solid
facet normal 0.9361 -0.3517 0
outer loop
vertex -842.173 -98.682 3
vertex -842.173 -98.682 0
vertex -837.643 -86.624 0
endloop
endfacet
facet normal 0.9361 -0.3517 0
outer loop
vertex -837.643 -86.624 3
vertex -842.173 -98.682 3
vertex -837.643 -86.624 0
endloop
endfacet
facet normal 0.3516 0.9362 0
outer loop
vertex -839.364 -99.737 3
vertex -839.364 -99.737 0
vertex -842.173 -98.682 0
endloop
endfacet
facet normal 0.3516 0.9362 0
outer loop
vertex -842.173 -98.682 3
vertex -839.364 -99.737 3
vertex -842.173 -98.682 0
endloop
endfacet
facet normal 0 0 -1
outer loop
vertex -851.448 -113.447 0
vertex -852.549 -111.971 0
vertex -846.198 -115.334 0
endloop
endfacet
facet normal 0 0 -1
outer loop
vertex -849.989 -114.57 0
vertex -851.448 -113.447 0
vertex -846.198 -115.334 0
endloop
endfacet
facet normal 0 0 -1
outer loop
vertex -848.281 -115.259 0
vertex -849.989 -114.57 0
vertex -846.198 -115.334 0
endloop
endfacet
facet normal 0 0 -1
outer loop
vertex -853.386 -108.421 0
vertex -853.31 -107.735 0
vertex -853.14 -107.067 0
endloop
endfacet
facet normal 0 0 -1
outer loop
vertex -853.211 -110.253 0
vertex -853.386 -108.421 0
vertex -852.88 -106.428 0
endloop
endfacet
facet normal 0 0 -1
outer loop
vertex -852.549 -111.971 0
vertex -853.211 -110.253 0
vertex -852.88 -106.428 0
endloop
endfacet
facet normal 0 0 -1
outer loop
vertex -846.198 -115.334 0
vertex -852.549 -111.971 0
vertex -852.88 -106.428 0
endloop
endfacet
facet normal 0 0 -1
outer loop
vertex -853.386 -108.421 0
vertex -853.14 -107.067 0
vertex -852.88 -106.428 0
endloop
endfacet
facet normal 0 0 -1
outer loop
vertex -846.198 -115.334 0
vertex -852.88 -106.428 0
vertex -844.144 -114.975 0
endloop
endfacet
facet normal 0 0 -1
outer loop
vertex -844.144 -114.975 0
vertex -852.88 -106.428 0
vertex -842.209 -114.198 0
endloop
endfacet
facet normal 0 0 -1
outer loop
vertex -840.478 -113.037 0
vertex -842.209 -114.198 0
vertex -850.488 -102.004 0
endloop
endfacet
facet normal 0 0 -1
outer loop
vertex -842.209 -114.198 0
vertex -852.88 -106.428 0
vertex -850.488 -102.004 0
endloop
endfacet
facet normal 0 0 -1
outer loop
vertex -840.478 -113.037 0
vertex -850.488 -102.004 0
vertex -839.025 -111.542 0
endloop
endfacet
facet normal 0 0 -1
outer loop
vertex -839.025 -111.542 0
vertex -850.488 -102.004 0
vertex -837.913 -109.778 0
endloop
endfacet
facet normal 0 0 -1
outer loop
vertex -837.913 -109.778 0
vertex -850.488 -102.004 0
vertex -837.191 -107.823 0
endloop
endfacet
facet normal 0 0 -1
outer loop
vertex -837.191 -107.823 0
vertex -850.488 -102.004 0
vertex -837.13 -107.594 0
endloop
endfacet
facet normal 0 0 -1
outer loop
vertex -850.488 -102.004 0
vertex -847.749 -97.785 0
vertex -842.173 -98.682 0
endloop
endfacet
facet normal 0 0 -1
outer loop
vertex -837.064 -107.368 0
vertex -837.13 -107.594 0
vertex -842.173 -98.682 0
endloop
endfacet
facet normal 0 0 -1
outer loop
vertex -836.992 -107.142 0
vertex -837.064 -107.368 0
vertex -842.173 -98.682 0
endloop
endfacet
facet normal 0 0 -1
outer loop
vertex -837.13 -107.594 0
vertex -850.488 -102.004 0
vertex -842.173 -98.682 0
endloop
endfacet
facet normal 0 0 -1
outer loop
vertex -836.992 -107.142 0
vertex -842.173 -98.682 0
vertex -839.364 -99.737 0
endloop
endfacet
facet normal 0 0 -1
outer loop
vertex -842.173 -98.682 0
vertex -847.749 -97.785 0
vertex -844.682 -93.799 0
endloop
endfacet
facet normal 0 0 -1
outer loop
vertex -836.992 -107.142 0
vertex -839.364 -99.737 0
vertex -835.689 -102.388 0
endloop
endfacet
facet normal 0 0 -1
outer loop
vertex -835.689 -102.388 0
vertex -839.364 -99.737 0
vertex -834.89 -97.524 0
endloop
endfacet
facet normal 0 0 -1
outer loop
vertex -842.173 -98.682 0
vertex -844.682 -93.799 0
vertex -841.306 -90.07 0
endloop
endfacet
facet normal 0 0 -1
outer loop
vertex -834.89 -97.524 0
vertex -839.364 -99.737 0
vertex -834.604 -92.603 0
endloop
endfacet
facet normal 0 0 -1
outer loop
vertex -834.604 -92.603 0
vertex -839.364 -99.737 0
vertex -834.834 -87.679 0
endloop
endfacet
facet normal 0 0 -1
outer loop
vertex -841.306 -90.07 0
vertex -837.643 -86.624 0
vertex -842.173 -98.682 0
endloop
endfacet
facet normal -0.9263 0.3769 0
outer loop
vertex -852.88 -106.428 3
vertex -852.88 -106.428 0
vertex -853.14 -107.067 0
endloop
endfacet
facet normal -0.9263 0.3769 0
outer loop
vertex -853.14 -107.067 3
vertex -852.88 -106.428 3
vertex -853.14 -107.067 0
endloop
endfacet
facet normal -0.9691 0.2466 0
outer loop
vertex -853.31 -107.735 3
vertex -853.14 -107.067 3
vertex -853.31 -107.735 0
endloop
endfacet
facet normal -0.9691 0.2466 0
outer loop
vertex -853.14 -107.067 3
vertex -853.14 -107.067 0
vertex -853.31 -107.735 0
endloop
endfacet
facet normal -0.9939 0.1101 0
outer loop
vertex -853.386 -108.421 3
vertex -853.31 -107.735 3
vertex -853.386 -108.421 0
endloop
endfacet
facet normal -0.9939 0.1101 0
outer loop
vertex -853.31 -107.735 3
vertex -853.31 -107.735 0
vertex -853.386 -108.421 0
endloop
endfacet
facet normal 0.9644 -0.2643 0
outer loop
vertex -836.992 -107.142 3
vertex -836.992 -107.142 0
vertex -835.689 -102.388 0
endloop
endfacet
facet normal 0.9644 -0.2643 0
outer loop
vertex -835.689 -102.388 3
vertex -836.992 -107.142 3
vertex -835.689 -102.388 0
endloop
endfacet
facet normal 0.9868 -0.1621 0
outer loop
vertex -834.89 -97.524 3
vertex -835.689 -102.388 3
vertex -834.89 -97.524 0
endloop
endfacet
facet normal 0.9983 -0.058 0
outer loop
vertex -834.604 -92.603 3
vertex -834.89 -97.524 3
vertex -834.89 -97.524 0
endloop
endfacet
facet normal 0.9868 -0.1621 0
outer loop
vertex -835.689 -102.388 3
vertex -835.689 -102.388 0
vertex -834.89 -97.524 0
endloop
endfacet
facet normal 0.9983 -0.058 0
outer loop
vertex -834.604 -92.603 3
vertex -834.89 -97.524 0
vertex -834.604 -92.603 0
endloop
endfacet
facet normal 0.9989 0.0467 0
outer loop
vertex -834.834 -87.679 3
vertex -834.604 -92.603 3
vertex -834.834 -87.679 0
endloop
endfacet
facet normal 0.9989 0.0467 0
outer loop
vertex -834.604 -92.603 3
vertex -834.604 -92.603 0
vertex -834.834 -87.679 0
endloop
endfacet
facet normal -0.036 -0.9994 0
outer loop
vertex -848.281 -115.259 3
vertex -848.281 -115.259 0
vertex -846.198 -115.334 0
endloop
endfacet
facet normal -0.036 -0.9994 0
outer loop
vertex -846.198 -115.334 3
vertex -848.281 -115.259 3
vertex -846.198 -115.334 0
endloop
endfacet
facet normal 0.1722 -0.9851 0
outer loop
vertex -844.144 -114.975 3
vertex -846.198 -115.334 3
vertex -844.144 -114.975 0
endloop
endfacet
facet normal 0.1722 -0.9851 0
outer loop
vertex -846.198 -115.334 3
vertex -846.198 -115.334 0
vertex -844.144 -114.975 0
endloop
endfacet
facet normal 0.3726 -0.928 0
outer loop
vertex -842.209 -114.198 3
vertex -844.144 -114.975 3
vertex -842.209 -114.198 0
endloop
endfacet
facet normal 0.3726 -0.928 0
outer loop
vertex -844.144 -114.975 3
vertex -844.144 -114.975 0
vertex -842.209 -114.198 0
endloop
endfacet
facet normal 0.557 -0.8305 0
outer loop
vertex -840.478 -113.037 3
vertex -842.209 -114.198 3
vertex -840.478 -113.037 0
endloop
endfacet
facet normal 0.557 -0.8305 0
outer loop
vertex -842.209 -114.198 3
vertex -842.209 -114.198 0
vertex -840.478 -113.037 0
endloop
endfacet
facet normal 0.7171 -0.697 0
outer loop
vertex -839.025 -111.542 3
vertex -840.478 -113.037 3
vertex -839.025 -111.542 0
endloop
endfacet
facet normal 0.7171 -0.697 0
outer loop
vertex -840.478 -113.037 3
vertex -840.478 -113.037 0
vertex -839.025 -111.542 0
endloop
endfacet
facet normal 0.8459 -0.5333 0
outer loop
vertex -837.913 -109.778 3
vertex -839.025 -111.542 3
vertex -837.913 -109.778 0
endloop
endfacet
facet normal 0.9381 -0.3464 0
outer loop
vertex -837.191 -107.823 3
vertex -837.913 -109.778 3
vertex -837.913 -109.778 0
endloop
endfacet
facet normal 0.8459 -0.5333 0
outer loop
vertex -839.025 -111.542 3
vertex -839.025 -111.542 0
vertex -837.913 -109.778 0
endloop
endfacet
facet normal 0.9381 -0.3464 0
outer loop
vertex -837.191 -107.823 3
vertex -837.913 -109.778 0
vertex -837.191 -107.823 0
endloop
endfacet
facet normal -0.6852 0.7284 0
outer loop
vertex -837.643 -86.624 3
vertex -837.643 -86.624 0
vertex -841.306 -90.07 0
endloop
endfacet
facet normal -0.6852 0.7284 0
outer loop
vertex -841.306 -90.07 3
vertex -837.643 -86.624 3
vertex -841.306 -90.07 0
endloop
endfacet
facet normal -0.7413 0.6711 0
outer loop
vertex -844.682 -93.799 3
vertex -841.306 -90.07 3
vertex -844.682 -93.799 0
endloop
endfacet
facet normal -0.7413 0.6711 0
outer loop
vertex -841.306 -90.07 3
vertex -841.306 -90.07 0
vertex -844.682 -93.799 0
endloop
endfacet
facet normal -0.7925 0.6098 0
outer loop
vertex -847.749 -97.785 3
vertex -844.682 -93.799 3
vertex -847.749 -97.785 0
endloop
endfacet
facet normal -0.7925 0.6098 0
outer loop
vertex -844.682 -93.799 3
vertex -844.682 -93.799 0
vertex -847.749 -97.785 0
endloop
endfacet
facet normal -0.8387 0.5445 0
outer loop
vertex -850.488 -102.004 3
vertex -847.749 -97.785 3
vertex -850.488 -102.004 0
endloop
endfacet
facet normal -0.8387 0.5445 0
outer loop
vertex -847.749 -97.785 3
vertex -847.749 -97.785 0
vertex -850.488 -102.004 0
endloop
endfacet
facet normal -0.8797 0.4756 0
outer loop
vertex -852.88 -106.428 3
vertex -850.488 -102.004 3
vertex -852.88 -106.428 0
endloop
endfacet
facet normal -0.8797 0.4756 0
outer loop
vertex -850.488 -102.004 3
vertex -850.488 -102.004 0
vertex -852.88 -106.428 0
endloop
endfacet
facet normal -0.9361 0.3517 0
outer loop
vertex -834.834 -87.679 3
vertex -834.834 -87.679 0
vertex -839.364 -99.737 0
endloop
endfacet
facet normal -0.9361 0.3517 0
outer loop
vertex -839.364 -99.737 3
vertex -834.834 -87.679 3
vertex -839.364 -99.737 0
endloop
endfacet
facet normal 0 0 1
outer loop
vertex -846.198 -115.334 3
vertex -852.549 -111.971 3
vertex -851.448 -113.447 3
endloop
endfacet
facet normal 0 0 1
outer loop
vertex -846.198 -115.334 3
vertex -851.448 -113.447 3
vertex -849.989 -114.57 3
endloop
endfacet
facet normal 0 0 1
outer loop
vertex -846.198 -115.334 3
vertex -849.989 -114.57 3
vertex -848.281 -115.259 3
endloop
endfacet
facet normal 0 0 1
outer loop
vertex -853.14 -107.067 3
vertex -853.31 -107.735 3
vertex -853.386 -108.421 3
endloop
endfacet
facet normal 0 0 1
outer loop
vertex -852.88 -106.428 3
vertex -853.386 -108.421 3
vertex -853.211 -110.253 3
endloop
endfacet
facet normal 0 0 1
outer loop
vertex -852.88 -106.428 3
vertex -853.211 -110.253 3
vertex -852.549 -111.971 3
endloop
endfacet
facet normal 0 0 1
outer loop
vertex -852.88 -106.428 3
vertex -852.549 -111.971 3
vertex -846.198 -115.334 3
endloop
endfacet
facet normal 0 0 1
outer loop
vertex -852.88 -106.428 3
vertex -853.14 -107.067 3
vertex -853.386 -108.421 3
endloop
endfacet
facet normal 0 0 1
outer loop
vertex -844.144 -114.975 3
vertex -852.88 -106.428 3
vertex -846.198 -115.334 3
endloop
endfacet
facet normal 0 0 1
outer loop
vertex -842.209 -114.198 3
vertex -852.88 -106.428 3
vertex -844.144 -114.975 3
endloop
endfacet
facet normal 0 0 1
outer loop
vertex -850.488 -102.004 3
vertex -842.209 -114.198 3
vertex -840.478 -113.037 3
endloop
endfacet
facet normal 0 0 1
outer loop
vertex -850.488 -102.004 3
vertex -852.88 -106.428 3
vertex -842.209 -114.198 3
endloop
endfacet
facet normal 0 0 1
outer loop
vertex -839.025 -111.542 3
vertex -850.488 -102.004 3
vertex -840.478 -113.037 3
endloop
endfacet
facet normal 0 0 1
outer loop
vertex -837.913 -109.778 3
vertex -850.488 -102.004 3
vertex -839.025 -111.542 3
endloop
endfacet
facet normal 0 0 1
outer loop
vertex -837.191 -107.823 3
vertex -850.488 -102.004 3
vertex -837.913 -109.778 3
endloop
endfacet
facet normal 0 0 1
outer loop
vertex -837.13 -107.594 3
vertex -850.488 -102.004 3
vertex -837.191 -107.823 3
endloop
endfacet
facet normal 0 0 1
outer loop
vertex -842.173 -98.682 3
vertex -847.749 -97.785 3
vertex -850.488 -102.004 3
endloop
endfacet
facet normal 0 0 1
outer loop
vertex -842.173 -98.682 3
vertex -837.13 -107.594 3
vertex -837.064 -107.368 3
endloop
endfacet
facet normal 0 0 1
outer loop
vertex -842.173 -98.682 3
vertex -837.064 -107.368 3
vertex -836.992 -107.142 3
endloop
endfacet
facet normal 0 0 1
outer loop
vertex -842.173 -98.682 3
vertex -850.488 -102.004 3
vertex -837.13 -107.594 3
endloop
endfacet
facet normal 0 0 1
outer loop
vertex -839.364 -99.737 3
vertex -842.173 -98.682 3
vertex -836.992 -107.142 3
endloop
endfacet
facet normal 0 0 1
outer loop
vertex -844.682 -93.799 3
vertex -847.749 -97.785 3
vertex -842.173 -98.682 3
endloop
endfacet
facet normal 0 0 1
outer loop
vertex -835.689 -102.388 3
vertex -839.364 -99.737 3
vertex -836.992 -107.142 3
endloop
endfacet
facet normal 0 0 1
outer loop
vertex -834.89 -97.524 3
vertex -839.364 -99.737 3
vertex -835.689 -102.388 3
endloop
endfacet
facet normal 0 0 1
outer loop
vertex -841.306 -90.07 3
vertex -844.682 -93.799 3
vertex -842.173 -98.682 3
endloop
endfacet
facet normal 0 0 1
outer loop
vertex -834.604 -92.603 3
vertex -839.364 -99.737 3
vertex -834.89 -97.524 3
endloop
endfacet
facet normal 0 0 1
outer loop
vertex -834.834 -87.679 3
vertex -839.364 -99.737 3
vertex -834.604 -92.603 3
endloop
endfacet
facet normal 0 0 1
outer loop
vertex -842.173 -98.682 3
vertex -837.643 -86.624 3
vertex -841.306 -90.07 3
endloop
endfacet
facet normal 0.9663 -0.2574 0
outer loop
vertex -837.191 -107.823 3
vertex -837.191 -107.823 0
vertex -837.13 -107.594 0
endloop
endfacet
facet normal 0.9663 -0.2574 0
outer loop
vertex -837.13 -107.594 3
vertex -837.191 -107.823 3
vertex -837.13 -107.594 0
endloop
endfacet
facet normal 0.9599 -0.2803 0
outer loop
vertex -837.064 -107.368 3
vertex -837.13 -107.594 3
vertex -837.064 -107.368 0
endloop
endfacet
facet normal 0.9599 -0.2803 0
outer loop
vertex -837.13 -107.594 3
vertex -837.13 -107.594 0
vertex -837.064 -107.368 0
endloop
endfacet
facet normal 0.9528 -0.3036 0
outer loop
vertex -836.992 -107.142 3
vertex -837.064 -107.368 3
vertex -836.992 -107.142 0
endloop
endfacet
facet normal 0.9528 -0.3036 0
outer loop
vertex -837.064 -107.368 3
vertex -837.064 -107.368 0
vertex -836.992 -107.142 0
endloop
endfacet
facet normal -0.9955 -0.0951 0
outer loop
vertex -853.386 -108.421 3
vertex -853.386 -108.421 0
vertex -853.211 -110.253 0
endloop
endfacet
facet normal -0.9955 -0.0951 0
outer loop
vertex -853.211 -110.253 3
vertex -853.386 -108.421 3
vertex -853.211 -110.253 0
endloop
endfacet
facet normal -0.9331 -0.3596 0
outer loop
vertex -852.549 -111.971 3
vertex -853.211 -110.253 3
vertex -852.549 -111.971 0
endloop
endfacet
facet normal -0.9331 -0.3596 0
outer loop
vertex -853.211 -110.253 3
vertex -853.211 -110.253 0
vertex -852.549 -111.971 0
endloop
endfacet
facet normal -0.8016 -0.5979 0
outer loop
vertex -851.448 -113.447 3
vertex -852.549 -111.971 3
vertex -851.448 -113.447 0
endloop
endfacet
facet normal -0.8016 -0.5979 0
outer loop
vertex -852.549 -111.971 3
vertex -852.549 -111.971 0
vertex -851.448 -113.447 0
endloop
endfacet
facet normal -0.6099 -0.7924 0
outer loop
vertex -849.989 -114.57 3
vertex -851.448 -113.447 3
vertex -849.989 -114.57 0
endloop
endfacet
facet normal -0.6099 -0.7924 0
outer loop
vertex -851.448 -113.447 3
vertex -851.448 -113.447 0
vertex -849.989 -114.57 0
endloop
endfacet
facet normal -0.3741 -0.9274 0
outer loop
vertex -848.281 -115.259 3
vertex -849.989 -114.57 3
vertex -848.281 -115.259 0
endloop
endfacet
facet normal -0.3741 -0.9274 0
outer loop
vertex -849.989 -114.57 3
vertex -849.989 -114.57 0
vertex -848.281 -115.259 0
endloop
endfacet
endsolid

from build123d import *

# Parameters (mm, degrees)
BASE_EXTRUDE_DEPTH = 3


with BuildPart() as part:
    # Sketch1 → Base-Extrude (new body)
    with BuildSketch(Plane.XY):
        with BuildLine():
            Line((-834.83434342, -87.678972665), (-839.364460389, -99.73670996))
            Line((-839.364460389, -99.73670996), (-842.172799168, -98.681611242))
            Line((-842.172799168, -98.681611242), (-837.642682199, -86.623873947))
            ThreePointArc((-837.642682199, -86.623873947), (-846.255704387, -95.761021528), (-852.880224121, -106.428137137))
            ThreePointArc((-852.880224121, -106.428137137), (-853.236644942, -107.398112585), (-853.386054738, -108.420641256))
            ThreePointArc((-853.386054738, -108.420641256), (-852.048634424, -112.746509925), (-848.281496833, -115.258582218))
            ThreePointArc((-848.281496833, -115.258582218), (-841.313301936, -113.662818896), (-837.190944526, -107.822581735))
            ThreePointArc((-837.190944526, -107.822581735), (-837.097500446, -107.480758655), (-836.992003912, -107.142461011))
            ThreePointArc((-836.992003912, -107.142461011), (-834.889529289, -97.524194802), (-834.83434342, -87.678972665))
        make_face()
    extrude(amount=BASE_EXTRUDE_DEPTH)


solid = part.part
